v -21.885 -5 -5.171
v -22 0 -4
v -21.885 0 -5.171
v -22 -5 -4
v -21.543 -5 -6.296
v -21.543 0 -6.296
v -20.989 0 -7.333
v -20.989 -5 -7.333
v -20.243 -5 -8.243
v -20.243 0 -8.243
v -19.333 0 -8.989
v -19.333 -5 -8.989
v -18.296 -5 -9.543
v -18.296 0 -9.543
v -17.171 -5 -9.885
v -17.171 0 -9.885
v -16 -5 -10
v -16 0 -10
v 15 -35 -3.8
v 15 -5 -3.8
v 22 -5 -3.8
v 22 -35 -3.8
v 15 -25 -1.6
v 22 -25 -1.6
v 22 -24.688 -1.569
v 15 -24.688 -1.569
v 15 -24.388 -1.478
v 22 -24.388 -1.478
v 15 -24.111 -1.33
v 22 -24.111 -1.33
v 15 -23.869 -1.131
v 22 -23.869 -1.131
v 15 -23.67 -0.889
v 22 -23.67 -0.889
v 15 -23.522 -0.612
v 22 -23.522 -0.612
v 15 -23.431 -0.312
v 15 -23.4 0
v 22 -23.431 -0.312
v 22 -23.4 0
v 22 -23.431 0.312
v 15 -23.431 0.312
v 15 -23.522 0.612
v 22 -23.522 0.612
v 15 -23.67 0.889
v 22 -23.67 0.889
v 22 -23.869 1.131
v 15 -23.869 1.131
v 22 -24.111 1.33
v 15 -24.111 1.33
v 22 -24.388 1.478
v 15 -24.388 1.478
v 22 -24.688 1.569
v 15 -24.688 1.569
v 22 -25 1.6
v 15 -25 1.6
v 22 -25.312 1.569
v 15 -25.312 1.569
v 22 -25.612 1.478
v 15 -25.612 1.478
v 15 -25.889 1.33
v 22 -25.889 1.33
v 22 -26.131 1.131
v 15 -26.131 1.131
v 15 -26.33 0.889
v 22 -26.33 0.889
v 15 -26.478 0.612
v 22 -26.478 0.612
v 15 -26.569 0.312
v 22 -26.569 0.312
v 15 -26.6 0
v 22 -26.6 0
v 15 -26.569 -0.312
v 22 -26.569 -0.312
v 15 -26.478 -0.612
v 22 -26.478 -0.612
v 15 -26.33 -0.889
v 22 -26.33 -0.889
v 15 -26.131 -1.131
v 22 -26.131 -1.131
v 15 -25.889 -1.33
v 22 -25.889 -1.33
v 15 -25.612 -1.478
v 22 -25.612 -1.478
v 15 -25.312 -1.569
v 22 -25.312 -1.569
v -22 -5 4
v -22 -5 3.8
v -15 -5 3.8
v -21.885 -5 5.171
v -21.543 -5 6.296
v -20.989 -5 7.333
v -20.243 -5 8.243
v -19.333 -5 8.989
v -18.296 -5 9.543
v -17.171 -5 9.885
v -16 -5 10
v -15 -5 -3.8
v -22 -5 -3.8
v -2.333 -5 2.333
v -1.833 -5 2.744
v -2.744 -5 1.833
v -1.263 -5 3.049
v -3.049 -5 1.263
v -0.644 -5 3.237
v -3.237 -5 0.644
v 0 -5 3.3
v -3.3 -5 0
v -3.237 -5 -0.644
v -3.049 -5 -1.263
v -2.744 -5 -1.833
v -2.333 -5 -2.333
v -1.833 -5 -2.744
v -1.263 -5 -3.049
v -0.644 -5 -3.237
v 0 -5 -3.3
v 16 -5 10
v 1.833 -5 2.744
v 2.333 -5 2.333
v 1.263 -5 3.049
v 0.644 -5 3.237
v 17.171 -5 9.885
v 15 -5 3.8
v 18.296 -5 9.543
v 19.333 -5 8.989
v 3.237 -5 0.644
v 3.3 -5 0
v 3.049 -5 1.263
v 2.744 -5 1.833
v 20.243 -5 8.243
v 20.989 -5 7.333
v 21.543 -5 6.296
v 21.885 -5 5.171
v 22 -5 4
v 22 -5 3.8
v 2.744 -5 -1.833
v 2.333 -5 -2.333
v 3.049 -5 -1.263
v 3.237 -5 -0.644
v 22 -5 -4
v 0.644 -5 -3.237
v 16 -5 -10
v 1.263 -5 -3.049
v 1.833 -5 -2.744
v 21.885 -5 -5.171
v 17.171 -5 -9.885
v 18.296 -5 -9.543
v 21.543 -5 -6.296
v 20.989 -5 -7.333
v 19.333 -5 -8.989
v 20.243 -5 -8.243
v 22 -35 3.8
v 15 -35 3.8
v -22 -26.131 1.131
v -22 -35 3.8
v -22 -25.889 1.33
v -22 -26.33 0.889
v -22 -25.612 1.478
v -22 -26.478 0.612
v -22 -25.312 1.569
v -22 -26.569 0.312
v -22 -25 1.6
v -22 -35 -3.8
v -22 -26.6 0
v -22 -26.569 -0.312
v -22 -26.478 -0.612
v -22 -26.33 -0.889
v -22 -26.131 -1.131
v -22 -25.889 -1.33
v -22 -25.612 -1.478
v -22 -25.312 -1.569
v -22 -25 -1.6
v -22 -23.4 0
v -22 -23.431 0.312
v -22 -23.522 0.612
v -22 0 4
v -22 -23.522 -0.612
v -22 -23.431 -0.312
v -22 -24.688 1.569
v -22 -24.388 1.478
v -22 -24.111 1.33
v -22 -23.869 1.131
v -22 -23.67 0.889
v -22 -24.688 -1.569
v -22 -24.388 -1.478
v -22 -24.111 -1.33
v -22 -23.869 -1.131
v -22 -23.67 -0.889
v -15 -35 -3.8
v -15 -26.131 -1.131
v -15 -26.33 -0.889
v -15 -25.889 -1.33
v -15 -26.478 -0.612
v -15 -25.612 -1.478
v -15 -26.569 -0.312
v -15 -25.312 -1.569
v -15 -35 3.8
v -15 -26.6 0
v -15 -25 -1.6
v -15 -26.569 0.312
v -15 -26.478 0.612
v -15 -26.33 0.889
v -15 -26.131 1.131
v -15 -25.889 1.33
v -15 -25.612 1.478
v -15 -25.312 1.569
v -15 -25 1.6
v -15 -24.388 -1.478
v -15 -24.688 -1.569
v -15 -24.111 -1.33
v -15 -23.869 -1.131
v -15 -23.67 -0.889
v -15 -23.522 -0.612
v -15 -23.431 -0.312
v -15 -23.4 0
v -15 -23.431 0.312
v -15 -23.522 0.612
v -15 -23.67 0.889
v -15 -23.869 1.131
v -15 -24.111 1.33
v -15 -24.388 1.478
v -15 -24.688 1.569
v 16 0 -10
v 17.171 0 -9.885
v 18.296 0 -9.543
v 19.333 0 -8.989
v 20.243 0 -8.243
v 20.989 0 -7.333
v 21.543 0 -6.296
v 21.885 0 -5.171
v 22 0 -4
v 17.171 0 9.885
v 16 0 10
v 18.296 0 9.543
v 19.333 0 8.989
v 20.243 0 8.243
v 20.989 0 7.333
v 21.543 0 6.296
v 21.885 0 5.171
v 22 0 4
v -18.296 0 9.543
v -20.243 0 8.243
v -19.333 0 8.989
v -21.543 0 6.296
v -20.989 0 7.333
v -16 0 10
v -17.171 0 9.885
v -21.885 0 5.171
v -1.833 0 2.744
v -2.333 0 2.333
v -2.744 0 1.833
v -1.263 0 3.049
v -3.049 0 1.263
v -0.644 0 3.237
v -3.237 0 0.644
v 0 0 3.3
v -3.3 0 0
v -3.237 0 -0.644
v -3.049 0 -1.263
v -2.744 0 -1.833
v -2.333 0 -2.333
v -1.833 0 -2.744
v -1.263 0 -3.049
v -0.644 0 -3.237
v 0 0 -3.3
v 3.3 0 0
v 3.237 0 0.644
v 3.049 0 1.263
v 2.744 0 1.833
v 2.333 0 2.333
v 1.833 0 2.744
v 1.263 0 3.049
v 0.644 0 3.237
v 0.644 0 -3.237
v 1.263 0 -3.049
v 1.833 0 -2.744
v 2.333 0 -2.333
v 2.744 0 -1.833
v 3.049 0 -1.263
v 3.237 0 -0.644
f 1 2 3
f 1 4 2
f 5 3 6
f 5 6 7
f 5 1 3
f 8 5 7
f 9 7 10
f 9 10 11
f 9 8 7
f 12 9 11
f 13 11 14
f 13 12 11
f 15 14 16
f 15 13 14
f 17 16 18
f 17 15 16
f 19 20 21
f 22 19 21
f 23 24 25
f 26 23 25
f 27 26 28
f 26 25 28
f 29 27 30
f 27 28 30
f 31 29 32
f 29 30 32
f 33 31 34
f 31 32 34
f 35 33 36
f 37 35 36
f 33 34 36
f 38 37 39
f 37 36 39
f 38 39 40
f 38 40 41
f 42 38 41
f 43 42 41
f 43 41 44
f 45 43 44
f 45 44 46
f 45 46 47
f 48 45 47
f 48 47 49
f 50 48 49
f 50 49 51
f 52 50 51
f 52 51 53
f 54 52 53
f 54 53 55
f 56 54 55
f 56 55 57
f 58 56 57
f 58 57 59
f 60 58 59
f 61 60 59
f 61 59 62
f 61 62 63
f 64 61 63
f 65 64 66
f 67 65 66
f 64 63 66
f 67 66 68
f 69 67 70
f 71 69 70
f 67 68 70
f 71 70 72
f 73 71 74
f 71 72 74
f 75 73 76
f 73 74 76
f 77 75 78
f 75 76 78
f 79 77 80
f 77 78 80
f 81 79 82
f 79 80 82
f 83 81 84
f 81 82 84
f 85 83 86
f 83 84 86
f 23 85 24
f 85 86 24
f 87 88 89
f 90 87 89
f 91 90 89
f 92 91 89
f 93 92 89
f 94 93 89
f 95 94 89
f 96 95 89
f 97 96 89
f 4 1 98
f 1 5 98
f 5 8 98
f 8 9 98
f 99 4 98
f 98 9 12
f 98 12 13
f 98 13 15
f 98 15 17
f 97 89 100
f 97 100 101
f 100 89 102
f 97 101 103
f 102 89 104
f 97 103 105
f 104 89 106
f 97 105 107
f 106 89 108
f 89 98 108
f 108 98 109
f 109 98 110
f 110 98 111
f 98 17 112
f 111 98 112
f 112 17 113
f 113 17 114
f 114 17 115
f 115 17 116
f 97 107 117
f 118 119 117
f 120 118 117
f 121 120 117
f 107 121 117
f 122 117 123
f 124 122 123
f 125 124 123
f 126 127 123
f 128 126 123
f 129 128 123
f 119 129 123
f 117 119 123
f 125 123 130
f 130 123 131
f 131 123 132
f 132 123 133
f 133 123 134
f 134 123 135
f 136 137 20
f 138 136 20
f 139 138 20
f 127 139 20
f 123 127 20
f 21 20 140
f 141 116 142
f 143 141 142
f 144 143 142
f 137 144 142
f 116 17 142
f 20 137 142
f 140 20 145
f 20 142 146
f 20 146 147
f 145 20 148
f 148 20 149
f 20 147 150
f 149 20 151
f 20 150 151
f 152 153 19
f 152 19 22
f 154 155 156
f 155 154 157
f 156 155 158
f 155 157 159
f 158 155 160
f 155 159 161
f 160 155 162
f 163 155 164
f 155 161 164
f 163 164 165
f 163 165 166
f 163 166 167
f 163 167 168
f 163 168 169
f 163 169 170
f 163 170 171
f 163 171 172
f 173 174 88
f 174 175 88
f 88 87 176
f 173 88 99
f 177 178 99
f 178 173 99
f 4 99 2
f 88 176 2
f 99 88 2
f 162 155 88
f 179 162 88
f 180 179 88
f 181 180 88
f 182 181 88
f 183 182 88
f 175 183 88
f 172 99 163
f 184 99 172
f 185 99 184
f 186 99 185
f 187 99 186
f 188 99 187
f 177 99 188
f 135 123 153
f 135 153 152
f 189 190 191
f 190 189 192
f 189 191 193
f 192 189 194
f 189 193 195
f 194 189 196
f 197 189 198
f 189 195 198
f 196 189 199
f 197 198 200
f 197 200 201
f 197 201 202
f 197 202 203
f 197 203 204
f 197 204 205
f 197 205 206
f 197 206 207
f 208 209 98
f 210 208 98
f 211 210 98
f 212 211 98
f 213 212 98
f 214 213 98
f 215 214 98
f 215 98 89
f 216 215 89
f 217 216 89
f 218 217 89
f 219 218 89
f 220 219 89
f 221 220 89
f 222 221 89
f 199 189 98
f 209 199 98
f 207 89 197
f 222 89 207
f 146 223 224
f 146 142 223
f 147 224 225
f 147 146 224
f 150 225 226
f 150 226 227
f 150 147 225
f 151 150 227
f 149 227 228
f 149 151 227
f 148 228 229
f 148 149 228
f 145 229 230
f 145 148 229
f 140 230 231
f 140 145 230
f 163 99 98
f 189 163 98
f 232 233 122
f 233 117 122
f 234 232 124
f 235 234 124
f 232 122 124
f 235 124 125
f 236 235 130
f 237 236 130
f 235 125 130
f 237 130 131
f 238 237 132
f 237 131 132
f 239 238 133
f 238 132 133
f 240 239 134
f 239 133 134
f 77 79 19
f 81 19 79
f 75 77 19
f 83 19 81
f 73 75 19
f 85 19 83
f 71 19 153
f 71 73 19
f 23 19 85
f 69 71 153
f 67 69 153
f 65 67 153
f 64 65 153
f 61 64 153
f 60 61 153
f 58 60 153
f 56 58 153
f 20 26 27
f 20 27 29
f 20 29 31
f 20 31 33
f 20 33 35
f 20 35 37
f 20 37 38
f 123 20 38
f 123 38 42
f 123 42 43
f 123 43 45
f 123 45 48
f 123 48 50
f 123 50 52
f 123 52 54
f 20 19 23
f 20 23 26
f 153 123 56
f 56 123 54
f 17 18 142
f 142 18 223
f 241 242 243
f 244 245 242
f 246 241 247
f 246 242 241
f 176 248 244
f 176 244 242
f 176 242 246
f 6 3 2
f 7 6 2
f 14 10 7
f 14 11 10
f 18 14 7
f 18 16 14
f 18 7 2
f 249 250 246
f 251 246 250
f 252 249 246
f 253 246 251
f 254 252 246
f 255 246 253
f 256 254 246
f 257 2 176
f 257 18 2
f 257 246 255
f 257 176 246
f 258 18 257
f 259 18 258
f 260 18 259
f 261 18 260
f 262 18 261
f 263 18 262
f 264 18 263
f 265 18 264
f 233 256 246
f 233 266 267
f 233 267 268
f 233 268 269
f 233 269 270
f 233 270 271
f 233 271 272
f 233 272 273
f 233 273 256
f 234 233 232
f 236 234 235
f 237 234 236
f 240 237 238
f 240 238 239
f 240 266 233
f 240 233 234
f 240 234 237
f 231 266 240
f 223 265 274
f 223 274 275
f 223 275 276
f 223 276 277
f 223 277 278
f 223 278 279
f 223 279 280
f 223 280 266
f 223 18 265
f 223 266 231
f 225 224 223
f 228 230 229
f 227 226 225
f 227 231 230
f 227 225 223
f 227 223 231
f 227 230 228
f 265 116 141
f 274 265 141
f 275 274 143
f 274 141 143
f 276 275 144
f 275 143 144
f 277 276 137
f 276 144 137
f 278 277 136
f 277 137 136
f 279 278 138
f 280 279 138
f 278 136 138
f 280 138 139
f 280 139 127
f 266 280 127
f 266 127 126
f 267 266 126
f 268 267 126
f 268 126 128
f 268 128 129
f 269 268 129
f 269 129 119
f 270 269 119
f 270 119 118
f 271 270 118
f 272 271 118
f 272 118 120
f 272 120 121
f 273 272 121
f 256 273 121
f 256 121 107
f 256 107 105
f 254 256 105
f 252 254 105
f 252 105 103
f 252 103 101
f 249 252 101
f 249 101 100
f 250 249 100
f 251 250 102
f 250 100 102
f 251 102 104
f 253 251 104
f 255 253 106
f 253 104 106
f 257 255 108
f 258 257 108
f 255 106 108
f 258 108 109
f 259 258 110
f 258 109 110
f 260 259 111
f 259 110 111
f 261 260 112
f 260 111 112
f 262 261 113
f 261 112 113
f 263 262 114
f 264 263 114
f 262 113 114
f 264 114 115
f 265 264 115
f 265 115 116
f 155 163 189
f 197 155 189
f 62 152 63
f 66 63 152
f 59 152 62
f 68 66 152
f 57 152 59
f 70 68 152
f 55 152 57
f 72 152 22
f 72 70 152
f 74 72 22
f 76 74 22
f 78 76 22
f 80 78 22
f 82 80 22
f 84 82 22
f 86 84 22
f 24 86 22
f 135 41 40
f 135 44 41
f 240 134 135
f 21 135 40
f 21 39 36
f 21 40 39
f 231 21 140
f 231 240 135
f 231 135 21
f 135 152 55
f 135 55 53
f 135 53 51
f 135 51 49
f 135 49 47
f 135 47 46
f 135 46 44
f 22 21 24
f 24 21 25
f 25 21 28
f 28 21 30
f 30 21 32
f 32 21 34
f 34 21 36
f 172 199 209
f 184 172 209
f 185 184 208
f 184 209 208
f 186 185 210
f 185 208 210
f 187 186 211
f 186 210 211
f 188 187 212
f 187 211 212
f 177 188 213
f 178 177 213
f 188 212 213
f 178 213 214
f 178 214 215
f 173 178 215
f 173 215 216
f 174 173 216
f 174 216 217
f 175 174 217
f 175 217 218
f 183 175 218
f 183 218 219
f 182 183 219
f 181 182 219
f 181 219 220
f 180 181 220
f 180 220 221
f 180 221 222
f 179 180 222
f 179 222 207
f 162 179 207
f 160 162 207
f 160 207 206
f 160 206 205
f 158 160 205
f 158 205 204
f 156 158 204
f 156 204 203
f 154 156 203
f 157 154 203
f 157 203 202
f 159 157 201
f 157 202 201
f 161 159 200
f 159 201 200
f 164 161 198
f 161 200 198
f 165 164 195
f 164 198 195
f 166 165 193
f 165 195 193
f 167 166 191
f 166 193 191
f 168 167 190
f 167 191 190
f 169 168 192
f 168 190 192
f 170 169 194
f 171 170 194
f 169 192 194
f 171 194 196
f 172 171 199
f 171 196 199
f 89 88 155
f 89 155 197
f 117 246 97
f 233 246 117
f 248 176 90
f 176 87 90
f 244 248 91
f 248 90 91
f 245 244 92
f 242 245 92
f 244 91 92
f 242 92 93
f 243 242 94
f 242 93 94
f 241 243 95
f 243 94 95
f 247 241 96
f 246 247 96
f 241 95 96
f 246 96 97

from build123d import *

# Parameters (mm, degrees)
SKETCH_1_W          = 44
SKETCH_1_H          = 20
EXTRUDE_1_DEPTH     = 5
SKETCH_2_W          = 7
SKETCH_2_H          = 7.6
EXTRUDE_2_DEPTH     = 30
SKETCH_3_R          = 3.3
CUT_EXTRUDE_1_DEPTH = 39.522720569
FILLET_1_R          = 6
SKETCH_4_R          = 1.6
CUT_EXTRUDE_2_DEPTH = 58.105166141


with BuildPart() as part:
    # 草图1 → 凸台-拉伸1 (new body)
    with BuildSketch(Plane(origin=(0, 0, 0), x_dir=(1, 0, 0), z_dir=(0, 1, 0))):
        Rectangle(SKETCH_1_W, SKETCH_1_H)
    extrude(amount=-EXTRUDE_1_DEPTH)

    # 草图2 → 凸台-拉伸2 (add)
    with BuildSketch(Plane.XZ.offset(5)):
        with Locations((-18.5, 0)):
            Rectangle(SKETCH_2_W, SKETCH_2_H)
        with Locations((18.5, 0)):
            Rectangle(SKETCH_2_W, SKETCH_2_H)
    extrude(amount=EXTRUDE_2_DEPTH)

    # 草图3 → 切除-拉伸1 (cut, through all)
    with BuildSketch(Plane.XZ.offset(5)):
        with Locations(Location((0, 0, 0), (0, 0, 270))):
            Circle(SKETCH_3_R)
    extrude(amount=-CUT_EXTRUDE_1_DEPTH, mode=Mode.SUBTRACT)

    # 圆角1
    fillet_1_edges = [part.edges().sort_by_distance(p)[0] for p in [
        (22, -2.5, 10),
        (-22, -2.5, 10),
        (-22, -2.5, -10),
        (22, -2.5, -10),
    ]]
    fillet(fillet_1_edges, radius=FILLET_1_R)

    # 草图4 → 切除-拉伸2 (cut, through all)
    with BuildSketch(Plane(origin=(22, 0, 0), x_dir=(0, 0, -1), z_dir=(1, 0, 0))):
        with Locations((0, -25)):
            Circle(SKETCH_4_R)
    extrude(amount=-CUT_EXTRUDE_2_DEPTH, mode=Mode.SUBTRACT)


solid = part.part
